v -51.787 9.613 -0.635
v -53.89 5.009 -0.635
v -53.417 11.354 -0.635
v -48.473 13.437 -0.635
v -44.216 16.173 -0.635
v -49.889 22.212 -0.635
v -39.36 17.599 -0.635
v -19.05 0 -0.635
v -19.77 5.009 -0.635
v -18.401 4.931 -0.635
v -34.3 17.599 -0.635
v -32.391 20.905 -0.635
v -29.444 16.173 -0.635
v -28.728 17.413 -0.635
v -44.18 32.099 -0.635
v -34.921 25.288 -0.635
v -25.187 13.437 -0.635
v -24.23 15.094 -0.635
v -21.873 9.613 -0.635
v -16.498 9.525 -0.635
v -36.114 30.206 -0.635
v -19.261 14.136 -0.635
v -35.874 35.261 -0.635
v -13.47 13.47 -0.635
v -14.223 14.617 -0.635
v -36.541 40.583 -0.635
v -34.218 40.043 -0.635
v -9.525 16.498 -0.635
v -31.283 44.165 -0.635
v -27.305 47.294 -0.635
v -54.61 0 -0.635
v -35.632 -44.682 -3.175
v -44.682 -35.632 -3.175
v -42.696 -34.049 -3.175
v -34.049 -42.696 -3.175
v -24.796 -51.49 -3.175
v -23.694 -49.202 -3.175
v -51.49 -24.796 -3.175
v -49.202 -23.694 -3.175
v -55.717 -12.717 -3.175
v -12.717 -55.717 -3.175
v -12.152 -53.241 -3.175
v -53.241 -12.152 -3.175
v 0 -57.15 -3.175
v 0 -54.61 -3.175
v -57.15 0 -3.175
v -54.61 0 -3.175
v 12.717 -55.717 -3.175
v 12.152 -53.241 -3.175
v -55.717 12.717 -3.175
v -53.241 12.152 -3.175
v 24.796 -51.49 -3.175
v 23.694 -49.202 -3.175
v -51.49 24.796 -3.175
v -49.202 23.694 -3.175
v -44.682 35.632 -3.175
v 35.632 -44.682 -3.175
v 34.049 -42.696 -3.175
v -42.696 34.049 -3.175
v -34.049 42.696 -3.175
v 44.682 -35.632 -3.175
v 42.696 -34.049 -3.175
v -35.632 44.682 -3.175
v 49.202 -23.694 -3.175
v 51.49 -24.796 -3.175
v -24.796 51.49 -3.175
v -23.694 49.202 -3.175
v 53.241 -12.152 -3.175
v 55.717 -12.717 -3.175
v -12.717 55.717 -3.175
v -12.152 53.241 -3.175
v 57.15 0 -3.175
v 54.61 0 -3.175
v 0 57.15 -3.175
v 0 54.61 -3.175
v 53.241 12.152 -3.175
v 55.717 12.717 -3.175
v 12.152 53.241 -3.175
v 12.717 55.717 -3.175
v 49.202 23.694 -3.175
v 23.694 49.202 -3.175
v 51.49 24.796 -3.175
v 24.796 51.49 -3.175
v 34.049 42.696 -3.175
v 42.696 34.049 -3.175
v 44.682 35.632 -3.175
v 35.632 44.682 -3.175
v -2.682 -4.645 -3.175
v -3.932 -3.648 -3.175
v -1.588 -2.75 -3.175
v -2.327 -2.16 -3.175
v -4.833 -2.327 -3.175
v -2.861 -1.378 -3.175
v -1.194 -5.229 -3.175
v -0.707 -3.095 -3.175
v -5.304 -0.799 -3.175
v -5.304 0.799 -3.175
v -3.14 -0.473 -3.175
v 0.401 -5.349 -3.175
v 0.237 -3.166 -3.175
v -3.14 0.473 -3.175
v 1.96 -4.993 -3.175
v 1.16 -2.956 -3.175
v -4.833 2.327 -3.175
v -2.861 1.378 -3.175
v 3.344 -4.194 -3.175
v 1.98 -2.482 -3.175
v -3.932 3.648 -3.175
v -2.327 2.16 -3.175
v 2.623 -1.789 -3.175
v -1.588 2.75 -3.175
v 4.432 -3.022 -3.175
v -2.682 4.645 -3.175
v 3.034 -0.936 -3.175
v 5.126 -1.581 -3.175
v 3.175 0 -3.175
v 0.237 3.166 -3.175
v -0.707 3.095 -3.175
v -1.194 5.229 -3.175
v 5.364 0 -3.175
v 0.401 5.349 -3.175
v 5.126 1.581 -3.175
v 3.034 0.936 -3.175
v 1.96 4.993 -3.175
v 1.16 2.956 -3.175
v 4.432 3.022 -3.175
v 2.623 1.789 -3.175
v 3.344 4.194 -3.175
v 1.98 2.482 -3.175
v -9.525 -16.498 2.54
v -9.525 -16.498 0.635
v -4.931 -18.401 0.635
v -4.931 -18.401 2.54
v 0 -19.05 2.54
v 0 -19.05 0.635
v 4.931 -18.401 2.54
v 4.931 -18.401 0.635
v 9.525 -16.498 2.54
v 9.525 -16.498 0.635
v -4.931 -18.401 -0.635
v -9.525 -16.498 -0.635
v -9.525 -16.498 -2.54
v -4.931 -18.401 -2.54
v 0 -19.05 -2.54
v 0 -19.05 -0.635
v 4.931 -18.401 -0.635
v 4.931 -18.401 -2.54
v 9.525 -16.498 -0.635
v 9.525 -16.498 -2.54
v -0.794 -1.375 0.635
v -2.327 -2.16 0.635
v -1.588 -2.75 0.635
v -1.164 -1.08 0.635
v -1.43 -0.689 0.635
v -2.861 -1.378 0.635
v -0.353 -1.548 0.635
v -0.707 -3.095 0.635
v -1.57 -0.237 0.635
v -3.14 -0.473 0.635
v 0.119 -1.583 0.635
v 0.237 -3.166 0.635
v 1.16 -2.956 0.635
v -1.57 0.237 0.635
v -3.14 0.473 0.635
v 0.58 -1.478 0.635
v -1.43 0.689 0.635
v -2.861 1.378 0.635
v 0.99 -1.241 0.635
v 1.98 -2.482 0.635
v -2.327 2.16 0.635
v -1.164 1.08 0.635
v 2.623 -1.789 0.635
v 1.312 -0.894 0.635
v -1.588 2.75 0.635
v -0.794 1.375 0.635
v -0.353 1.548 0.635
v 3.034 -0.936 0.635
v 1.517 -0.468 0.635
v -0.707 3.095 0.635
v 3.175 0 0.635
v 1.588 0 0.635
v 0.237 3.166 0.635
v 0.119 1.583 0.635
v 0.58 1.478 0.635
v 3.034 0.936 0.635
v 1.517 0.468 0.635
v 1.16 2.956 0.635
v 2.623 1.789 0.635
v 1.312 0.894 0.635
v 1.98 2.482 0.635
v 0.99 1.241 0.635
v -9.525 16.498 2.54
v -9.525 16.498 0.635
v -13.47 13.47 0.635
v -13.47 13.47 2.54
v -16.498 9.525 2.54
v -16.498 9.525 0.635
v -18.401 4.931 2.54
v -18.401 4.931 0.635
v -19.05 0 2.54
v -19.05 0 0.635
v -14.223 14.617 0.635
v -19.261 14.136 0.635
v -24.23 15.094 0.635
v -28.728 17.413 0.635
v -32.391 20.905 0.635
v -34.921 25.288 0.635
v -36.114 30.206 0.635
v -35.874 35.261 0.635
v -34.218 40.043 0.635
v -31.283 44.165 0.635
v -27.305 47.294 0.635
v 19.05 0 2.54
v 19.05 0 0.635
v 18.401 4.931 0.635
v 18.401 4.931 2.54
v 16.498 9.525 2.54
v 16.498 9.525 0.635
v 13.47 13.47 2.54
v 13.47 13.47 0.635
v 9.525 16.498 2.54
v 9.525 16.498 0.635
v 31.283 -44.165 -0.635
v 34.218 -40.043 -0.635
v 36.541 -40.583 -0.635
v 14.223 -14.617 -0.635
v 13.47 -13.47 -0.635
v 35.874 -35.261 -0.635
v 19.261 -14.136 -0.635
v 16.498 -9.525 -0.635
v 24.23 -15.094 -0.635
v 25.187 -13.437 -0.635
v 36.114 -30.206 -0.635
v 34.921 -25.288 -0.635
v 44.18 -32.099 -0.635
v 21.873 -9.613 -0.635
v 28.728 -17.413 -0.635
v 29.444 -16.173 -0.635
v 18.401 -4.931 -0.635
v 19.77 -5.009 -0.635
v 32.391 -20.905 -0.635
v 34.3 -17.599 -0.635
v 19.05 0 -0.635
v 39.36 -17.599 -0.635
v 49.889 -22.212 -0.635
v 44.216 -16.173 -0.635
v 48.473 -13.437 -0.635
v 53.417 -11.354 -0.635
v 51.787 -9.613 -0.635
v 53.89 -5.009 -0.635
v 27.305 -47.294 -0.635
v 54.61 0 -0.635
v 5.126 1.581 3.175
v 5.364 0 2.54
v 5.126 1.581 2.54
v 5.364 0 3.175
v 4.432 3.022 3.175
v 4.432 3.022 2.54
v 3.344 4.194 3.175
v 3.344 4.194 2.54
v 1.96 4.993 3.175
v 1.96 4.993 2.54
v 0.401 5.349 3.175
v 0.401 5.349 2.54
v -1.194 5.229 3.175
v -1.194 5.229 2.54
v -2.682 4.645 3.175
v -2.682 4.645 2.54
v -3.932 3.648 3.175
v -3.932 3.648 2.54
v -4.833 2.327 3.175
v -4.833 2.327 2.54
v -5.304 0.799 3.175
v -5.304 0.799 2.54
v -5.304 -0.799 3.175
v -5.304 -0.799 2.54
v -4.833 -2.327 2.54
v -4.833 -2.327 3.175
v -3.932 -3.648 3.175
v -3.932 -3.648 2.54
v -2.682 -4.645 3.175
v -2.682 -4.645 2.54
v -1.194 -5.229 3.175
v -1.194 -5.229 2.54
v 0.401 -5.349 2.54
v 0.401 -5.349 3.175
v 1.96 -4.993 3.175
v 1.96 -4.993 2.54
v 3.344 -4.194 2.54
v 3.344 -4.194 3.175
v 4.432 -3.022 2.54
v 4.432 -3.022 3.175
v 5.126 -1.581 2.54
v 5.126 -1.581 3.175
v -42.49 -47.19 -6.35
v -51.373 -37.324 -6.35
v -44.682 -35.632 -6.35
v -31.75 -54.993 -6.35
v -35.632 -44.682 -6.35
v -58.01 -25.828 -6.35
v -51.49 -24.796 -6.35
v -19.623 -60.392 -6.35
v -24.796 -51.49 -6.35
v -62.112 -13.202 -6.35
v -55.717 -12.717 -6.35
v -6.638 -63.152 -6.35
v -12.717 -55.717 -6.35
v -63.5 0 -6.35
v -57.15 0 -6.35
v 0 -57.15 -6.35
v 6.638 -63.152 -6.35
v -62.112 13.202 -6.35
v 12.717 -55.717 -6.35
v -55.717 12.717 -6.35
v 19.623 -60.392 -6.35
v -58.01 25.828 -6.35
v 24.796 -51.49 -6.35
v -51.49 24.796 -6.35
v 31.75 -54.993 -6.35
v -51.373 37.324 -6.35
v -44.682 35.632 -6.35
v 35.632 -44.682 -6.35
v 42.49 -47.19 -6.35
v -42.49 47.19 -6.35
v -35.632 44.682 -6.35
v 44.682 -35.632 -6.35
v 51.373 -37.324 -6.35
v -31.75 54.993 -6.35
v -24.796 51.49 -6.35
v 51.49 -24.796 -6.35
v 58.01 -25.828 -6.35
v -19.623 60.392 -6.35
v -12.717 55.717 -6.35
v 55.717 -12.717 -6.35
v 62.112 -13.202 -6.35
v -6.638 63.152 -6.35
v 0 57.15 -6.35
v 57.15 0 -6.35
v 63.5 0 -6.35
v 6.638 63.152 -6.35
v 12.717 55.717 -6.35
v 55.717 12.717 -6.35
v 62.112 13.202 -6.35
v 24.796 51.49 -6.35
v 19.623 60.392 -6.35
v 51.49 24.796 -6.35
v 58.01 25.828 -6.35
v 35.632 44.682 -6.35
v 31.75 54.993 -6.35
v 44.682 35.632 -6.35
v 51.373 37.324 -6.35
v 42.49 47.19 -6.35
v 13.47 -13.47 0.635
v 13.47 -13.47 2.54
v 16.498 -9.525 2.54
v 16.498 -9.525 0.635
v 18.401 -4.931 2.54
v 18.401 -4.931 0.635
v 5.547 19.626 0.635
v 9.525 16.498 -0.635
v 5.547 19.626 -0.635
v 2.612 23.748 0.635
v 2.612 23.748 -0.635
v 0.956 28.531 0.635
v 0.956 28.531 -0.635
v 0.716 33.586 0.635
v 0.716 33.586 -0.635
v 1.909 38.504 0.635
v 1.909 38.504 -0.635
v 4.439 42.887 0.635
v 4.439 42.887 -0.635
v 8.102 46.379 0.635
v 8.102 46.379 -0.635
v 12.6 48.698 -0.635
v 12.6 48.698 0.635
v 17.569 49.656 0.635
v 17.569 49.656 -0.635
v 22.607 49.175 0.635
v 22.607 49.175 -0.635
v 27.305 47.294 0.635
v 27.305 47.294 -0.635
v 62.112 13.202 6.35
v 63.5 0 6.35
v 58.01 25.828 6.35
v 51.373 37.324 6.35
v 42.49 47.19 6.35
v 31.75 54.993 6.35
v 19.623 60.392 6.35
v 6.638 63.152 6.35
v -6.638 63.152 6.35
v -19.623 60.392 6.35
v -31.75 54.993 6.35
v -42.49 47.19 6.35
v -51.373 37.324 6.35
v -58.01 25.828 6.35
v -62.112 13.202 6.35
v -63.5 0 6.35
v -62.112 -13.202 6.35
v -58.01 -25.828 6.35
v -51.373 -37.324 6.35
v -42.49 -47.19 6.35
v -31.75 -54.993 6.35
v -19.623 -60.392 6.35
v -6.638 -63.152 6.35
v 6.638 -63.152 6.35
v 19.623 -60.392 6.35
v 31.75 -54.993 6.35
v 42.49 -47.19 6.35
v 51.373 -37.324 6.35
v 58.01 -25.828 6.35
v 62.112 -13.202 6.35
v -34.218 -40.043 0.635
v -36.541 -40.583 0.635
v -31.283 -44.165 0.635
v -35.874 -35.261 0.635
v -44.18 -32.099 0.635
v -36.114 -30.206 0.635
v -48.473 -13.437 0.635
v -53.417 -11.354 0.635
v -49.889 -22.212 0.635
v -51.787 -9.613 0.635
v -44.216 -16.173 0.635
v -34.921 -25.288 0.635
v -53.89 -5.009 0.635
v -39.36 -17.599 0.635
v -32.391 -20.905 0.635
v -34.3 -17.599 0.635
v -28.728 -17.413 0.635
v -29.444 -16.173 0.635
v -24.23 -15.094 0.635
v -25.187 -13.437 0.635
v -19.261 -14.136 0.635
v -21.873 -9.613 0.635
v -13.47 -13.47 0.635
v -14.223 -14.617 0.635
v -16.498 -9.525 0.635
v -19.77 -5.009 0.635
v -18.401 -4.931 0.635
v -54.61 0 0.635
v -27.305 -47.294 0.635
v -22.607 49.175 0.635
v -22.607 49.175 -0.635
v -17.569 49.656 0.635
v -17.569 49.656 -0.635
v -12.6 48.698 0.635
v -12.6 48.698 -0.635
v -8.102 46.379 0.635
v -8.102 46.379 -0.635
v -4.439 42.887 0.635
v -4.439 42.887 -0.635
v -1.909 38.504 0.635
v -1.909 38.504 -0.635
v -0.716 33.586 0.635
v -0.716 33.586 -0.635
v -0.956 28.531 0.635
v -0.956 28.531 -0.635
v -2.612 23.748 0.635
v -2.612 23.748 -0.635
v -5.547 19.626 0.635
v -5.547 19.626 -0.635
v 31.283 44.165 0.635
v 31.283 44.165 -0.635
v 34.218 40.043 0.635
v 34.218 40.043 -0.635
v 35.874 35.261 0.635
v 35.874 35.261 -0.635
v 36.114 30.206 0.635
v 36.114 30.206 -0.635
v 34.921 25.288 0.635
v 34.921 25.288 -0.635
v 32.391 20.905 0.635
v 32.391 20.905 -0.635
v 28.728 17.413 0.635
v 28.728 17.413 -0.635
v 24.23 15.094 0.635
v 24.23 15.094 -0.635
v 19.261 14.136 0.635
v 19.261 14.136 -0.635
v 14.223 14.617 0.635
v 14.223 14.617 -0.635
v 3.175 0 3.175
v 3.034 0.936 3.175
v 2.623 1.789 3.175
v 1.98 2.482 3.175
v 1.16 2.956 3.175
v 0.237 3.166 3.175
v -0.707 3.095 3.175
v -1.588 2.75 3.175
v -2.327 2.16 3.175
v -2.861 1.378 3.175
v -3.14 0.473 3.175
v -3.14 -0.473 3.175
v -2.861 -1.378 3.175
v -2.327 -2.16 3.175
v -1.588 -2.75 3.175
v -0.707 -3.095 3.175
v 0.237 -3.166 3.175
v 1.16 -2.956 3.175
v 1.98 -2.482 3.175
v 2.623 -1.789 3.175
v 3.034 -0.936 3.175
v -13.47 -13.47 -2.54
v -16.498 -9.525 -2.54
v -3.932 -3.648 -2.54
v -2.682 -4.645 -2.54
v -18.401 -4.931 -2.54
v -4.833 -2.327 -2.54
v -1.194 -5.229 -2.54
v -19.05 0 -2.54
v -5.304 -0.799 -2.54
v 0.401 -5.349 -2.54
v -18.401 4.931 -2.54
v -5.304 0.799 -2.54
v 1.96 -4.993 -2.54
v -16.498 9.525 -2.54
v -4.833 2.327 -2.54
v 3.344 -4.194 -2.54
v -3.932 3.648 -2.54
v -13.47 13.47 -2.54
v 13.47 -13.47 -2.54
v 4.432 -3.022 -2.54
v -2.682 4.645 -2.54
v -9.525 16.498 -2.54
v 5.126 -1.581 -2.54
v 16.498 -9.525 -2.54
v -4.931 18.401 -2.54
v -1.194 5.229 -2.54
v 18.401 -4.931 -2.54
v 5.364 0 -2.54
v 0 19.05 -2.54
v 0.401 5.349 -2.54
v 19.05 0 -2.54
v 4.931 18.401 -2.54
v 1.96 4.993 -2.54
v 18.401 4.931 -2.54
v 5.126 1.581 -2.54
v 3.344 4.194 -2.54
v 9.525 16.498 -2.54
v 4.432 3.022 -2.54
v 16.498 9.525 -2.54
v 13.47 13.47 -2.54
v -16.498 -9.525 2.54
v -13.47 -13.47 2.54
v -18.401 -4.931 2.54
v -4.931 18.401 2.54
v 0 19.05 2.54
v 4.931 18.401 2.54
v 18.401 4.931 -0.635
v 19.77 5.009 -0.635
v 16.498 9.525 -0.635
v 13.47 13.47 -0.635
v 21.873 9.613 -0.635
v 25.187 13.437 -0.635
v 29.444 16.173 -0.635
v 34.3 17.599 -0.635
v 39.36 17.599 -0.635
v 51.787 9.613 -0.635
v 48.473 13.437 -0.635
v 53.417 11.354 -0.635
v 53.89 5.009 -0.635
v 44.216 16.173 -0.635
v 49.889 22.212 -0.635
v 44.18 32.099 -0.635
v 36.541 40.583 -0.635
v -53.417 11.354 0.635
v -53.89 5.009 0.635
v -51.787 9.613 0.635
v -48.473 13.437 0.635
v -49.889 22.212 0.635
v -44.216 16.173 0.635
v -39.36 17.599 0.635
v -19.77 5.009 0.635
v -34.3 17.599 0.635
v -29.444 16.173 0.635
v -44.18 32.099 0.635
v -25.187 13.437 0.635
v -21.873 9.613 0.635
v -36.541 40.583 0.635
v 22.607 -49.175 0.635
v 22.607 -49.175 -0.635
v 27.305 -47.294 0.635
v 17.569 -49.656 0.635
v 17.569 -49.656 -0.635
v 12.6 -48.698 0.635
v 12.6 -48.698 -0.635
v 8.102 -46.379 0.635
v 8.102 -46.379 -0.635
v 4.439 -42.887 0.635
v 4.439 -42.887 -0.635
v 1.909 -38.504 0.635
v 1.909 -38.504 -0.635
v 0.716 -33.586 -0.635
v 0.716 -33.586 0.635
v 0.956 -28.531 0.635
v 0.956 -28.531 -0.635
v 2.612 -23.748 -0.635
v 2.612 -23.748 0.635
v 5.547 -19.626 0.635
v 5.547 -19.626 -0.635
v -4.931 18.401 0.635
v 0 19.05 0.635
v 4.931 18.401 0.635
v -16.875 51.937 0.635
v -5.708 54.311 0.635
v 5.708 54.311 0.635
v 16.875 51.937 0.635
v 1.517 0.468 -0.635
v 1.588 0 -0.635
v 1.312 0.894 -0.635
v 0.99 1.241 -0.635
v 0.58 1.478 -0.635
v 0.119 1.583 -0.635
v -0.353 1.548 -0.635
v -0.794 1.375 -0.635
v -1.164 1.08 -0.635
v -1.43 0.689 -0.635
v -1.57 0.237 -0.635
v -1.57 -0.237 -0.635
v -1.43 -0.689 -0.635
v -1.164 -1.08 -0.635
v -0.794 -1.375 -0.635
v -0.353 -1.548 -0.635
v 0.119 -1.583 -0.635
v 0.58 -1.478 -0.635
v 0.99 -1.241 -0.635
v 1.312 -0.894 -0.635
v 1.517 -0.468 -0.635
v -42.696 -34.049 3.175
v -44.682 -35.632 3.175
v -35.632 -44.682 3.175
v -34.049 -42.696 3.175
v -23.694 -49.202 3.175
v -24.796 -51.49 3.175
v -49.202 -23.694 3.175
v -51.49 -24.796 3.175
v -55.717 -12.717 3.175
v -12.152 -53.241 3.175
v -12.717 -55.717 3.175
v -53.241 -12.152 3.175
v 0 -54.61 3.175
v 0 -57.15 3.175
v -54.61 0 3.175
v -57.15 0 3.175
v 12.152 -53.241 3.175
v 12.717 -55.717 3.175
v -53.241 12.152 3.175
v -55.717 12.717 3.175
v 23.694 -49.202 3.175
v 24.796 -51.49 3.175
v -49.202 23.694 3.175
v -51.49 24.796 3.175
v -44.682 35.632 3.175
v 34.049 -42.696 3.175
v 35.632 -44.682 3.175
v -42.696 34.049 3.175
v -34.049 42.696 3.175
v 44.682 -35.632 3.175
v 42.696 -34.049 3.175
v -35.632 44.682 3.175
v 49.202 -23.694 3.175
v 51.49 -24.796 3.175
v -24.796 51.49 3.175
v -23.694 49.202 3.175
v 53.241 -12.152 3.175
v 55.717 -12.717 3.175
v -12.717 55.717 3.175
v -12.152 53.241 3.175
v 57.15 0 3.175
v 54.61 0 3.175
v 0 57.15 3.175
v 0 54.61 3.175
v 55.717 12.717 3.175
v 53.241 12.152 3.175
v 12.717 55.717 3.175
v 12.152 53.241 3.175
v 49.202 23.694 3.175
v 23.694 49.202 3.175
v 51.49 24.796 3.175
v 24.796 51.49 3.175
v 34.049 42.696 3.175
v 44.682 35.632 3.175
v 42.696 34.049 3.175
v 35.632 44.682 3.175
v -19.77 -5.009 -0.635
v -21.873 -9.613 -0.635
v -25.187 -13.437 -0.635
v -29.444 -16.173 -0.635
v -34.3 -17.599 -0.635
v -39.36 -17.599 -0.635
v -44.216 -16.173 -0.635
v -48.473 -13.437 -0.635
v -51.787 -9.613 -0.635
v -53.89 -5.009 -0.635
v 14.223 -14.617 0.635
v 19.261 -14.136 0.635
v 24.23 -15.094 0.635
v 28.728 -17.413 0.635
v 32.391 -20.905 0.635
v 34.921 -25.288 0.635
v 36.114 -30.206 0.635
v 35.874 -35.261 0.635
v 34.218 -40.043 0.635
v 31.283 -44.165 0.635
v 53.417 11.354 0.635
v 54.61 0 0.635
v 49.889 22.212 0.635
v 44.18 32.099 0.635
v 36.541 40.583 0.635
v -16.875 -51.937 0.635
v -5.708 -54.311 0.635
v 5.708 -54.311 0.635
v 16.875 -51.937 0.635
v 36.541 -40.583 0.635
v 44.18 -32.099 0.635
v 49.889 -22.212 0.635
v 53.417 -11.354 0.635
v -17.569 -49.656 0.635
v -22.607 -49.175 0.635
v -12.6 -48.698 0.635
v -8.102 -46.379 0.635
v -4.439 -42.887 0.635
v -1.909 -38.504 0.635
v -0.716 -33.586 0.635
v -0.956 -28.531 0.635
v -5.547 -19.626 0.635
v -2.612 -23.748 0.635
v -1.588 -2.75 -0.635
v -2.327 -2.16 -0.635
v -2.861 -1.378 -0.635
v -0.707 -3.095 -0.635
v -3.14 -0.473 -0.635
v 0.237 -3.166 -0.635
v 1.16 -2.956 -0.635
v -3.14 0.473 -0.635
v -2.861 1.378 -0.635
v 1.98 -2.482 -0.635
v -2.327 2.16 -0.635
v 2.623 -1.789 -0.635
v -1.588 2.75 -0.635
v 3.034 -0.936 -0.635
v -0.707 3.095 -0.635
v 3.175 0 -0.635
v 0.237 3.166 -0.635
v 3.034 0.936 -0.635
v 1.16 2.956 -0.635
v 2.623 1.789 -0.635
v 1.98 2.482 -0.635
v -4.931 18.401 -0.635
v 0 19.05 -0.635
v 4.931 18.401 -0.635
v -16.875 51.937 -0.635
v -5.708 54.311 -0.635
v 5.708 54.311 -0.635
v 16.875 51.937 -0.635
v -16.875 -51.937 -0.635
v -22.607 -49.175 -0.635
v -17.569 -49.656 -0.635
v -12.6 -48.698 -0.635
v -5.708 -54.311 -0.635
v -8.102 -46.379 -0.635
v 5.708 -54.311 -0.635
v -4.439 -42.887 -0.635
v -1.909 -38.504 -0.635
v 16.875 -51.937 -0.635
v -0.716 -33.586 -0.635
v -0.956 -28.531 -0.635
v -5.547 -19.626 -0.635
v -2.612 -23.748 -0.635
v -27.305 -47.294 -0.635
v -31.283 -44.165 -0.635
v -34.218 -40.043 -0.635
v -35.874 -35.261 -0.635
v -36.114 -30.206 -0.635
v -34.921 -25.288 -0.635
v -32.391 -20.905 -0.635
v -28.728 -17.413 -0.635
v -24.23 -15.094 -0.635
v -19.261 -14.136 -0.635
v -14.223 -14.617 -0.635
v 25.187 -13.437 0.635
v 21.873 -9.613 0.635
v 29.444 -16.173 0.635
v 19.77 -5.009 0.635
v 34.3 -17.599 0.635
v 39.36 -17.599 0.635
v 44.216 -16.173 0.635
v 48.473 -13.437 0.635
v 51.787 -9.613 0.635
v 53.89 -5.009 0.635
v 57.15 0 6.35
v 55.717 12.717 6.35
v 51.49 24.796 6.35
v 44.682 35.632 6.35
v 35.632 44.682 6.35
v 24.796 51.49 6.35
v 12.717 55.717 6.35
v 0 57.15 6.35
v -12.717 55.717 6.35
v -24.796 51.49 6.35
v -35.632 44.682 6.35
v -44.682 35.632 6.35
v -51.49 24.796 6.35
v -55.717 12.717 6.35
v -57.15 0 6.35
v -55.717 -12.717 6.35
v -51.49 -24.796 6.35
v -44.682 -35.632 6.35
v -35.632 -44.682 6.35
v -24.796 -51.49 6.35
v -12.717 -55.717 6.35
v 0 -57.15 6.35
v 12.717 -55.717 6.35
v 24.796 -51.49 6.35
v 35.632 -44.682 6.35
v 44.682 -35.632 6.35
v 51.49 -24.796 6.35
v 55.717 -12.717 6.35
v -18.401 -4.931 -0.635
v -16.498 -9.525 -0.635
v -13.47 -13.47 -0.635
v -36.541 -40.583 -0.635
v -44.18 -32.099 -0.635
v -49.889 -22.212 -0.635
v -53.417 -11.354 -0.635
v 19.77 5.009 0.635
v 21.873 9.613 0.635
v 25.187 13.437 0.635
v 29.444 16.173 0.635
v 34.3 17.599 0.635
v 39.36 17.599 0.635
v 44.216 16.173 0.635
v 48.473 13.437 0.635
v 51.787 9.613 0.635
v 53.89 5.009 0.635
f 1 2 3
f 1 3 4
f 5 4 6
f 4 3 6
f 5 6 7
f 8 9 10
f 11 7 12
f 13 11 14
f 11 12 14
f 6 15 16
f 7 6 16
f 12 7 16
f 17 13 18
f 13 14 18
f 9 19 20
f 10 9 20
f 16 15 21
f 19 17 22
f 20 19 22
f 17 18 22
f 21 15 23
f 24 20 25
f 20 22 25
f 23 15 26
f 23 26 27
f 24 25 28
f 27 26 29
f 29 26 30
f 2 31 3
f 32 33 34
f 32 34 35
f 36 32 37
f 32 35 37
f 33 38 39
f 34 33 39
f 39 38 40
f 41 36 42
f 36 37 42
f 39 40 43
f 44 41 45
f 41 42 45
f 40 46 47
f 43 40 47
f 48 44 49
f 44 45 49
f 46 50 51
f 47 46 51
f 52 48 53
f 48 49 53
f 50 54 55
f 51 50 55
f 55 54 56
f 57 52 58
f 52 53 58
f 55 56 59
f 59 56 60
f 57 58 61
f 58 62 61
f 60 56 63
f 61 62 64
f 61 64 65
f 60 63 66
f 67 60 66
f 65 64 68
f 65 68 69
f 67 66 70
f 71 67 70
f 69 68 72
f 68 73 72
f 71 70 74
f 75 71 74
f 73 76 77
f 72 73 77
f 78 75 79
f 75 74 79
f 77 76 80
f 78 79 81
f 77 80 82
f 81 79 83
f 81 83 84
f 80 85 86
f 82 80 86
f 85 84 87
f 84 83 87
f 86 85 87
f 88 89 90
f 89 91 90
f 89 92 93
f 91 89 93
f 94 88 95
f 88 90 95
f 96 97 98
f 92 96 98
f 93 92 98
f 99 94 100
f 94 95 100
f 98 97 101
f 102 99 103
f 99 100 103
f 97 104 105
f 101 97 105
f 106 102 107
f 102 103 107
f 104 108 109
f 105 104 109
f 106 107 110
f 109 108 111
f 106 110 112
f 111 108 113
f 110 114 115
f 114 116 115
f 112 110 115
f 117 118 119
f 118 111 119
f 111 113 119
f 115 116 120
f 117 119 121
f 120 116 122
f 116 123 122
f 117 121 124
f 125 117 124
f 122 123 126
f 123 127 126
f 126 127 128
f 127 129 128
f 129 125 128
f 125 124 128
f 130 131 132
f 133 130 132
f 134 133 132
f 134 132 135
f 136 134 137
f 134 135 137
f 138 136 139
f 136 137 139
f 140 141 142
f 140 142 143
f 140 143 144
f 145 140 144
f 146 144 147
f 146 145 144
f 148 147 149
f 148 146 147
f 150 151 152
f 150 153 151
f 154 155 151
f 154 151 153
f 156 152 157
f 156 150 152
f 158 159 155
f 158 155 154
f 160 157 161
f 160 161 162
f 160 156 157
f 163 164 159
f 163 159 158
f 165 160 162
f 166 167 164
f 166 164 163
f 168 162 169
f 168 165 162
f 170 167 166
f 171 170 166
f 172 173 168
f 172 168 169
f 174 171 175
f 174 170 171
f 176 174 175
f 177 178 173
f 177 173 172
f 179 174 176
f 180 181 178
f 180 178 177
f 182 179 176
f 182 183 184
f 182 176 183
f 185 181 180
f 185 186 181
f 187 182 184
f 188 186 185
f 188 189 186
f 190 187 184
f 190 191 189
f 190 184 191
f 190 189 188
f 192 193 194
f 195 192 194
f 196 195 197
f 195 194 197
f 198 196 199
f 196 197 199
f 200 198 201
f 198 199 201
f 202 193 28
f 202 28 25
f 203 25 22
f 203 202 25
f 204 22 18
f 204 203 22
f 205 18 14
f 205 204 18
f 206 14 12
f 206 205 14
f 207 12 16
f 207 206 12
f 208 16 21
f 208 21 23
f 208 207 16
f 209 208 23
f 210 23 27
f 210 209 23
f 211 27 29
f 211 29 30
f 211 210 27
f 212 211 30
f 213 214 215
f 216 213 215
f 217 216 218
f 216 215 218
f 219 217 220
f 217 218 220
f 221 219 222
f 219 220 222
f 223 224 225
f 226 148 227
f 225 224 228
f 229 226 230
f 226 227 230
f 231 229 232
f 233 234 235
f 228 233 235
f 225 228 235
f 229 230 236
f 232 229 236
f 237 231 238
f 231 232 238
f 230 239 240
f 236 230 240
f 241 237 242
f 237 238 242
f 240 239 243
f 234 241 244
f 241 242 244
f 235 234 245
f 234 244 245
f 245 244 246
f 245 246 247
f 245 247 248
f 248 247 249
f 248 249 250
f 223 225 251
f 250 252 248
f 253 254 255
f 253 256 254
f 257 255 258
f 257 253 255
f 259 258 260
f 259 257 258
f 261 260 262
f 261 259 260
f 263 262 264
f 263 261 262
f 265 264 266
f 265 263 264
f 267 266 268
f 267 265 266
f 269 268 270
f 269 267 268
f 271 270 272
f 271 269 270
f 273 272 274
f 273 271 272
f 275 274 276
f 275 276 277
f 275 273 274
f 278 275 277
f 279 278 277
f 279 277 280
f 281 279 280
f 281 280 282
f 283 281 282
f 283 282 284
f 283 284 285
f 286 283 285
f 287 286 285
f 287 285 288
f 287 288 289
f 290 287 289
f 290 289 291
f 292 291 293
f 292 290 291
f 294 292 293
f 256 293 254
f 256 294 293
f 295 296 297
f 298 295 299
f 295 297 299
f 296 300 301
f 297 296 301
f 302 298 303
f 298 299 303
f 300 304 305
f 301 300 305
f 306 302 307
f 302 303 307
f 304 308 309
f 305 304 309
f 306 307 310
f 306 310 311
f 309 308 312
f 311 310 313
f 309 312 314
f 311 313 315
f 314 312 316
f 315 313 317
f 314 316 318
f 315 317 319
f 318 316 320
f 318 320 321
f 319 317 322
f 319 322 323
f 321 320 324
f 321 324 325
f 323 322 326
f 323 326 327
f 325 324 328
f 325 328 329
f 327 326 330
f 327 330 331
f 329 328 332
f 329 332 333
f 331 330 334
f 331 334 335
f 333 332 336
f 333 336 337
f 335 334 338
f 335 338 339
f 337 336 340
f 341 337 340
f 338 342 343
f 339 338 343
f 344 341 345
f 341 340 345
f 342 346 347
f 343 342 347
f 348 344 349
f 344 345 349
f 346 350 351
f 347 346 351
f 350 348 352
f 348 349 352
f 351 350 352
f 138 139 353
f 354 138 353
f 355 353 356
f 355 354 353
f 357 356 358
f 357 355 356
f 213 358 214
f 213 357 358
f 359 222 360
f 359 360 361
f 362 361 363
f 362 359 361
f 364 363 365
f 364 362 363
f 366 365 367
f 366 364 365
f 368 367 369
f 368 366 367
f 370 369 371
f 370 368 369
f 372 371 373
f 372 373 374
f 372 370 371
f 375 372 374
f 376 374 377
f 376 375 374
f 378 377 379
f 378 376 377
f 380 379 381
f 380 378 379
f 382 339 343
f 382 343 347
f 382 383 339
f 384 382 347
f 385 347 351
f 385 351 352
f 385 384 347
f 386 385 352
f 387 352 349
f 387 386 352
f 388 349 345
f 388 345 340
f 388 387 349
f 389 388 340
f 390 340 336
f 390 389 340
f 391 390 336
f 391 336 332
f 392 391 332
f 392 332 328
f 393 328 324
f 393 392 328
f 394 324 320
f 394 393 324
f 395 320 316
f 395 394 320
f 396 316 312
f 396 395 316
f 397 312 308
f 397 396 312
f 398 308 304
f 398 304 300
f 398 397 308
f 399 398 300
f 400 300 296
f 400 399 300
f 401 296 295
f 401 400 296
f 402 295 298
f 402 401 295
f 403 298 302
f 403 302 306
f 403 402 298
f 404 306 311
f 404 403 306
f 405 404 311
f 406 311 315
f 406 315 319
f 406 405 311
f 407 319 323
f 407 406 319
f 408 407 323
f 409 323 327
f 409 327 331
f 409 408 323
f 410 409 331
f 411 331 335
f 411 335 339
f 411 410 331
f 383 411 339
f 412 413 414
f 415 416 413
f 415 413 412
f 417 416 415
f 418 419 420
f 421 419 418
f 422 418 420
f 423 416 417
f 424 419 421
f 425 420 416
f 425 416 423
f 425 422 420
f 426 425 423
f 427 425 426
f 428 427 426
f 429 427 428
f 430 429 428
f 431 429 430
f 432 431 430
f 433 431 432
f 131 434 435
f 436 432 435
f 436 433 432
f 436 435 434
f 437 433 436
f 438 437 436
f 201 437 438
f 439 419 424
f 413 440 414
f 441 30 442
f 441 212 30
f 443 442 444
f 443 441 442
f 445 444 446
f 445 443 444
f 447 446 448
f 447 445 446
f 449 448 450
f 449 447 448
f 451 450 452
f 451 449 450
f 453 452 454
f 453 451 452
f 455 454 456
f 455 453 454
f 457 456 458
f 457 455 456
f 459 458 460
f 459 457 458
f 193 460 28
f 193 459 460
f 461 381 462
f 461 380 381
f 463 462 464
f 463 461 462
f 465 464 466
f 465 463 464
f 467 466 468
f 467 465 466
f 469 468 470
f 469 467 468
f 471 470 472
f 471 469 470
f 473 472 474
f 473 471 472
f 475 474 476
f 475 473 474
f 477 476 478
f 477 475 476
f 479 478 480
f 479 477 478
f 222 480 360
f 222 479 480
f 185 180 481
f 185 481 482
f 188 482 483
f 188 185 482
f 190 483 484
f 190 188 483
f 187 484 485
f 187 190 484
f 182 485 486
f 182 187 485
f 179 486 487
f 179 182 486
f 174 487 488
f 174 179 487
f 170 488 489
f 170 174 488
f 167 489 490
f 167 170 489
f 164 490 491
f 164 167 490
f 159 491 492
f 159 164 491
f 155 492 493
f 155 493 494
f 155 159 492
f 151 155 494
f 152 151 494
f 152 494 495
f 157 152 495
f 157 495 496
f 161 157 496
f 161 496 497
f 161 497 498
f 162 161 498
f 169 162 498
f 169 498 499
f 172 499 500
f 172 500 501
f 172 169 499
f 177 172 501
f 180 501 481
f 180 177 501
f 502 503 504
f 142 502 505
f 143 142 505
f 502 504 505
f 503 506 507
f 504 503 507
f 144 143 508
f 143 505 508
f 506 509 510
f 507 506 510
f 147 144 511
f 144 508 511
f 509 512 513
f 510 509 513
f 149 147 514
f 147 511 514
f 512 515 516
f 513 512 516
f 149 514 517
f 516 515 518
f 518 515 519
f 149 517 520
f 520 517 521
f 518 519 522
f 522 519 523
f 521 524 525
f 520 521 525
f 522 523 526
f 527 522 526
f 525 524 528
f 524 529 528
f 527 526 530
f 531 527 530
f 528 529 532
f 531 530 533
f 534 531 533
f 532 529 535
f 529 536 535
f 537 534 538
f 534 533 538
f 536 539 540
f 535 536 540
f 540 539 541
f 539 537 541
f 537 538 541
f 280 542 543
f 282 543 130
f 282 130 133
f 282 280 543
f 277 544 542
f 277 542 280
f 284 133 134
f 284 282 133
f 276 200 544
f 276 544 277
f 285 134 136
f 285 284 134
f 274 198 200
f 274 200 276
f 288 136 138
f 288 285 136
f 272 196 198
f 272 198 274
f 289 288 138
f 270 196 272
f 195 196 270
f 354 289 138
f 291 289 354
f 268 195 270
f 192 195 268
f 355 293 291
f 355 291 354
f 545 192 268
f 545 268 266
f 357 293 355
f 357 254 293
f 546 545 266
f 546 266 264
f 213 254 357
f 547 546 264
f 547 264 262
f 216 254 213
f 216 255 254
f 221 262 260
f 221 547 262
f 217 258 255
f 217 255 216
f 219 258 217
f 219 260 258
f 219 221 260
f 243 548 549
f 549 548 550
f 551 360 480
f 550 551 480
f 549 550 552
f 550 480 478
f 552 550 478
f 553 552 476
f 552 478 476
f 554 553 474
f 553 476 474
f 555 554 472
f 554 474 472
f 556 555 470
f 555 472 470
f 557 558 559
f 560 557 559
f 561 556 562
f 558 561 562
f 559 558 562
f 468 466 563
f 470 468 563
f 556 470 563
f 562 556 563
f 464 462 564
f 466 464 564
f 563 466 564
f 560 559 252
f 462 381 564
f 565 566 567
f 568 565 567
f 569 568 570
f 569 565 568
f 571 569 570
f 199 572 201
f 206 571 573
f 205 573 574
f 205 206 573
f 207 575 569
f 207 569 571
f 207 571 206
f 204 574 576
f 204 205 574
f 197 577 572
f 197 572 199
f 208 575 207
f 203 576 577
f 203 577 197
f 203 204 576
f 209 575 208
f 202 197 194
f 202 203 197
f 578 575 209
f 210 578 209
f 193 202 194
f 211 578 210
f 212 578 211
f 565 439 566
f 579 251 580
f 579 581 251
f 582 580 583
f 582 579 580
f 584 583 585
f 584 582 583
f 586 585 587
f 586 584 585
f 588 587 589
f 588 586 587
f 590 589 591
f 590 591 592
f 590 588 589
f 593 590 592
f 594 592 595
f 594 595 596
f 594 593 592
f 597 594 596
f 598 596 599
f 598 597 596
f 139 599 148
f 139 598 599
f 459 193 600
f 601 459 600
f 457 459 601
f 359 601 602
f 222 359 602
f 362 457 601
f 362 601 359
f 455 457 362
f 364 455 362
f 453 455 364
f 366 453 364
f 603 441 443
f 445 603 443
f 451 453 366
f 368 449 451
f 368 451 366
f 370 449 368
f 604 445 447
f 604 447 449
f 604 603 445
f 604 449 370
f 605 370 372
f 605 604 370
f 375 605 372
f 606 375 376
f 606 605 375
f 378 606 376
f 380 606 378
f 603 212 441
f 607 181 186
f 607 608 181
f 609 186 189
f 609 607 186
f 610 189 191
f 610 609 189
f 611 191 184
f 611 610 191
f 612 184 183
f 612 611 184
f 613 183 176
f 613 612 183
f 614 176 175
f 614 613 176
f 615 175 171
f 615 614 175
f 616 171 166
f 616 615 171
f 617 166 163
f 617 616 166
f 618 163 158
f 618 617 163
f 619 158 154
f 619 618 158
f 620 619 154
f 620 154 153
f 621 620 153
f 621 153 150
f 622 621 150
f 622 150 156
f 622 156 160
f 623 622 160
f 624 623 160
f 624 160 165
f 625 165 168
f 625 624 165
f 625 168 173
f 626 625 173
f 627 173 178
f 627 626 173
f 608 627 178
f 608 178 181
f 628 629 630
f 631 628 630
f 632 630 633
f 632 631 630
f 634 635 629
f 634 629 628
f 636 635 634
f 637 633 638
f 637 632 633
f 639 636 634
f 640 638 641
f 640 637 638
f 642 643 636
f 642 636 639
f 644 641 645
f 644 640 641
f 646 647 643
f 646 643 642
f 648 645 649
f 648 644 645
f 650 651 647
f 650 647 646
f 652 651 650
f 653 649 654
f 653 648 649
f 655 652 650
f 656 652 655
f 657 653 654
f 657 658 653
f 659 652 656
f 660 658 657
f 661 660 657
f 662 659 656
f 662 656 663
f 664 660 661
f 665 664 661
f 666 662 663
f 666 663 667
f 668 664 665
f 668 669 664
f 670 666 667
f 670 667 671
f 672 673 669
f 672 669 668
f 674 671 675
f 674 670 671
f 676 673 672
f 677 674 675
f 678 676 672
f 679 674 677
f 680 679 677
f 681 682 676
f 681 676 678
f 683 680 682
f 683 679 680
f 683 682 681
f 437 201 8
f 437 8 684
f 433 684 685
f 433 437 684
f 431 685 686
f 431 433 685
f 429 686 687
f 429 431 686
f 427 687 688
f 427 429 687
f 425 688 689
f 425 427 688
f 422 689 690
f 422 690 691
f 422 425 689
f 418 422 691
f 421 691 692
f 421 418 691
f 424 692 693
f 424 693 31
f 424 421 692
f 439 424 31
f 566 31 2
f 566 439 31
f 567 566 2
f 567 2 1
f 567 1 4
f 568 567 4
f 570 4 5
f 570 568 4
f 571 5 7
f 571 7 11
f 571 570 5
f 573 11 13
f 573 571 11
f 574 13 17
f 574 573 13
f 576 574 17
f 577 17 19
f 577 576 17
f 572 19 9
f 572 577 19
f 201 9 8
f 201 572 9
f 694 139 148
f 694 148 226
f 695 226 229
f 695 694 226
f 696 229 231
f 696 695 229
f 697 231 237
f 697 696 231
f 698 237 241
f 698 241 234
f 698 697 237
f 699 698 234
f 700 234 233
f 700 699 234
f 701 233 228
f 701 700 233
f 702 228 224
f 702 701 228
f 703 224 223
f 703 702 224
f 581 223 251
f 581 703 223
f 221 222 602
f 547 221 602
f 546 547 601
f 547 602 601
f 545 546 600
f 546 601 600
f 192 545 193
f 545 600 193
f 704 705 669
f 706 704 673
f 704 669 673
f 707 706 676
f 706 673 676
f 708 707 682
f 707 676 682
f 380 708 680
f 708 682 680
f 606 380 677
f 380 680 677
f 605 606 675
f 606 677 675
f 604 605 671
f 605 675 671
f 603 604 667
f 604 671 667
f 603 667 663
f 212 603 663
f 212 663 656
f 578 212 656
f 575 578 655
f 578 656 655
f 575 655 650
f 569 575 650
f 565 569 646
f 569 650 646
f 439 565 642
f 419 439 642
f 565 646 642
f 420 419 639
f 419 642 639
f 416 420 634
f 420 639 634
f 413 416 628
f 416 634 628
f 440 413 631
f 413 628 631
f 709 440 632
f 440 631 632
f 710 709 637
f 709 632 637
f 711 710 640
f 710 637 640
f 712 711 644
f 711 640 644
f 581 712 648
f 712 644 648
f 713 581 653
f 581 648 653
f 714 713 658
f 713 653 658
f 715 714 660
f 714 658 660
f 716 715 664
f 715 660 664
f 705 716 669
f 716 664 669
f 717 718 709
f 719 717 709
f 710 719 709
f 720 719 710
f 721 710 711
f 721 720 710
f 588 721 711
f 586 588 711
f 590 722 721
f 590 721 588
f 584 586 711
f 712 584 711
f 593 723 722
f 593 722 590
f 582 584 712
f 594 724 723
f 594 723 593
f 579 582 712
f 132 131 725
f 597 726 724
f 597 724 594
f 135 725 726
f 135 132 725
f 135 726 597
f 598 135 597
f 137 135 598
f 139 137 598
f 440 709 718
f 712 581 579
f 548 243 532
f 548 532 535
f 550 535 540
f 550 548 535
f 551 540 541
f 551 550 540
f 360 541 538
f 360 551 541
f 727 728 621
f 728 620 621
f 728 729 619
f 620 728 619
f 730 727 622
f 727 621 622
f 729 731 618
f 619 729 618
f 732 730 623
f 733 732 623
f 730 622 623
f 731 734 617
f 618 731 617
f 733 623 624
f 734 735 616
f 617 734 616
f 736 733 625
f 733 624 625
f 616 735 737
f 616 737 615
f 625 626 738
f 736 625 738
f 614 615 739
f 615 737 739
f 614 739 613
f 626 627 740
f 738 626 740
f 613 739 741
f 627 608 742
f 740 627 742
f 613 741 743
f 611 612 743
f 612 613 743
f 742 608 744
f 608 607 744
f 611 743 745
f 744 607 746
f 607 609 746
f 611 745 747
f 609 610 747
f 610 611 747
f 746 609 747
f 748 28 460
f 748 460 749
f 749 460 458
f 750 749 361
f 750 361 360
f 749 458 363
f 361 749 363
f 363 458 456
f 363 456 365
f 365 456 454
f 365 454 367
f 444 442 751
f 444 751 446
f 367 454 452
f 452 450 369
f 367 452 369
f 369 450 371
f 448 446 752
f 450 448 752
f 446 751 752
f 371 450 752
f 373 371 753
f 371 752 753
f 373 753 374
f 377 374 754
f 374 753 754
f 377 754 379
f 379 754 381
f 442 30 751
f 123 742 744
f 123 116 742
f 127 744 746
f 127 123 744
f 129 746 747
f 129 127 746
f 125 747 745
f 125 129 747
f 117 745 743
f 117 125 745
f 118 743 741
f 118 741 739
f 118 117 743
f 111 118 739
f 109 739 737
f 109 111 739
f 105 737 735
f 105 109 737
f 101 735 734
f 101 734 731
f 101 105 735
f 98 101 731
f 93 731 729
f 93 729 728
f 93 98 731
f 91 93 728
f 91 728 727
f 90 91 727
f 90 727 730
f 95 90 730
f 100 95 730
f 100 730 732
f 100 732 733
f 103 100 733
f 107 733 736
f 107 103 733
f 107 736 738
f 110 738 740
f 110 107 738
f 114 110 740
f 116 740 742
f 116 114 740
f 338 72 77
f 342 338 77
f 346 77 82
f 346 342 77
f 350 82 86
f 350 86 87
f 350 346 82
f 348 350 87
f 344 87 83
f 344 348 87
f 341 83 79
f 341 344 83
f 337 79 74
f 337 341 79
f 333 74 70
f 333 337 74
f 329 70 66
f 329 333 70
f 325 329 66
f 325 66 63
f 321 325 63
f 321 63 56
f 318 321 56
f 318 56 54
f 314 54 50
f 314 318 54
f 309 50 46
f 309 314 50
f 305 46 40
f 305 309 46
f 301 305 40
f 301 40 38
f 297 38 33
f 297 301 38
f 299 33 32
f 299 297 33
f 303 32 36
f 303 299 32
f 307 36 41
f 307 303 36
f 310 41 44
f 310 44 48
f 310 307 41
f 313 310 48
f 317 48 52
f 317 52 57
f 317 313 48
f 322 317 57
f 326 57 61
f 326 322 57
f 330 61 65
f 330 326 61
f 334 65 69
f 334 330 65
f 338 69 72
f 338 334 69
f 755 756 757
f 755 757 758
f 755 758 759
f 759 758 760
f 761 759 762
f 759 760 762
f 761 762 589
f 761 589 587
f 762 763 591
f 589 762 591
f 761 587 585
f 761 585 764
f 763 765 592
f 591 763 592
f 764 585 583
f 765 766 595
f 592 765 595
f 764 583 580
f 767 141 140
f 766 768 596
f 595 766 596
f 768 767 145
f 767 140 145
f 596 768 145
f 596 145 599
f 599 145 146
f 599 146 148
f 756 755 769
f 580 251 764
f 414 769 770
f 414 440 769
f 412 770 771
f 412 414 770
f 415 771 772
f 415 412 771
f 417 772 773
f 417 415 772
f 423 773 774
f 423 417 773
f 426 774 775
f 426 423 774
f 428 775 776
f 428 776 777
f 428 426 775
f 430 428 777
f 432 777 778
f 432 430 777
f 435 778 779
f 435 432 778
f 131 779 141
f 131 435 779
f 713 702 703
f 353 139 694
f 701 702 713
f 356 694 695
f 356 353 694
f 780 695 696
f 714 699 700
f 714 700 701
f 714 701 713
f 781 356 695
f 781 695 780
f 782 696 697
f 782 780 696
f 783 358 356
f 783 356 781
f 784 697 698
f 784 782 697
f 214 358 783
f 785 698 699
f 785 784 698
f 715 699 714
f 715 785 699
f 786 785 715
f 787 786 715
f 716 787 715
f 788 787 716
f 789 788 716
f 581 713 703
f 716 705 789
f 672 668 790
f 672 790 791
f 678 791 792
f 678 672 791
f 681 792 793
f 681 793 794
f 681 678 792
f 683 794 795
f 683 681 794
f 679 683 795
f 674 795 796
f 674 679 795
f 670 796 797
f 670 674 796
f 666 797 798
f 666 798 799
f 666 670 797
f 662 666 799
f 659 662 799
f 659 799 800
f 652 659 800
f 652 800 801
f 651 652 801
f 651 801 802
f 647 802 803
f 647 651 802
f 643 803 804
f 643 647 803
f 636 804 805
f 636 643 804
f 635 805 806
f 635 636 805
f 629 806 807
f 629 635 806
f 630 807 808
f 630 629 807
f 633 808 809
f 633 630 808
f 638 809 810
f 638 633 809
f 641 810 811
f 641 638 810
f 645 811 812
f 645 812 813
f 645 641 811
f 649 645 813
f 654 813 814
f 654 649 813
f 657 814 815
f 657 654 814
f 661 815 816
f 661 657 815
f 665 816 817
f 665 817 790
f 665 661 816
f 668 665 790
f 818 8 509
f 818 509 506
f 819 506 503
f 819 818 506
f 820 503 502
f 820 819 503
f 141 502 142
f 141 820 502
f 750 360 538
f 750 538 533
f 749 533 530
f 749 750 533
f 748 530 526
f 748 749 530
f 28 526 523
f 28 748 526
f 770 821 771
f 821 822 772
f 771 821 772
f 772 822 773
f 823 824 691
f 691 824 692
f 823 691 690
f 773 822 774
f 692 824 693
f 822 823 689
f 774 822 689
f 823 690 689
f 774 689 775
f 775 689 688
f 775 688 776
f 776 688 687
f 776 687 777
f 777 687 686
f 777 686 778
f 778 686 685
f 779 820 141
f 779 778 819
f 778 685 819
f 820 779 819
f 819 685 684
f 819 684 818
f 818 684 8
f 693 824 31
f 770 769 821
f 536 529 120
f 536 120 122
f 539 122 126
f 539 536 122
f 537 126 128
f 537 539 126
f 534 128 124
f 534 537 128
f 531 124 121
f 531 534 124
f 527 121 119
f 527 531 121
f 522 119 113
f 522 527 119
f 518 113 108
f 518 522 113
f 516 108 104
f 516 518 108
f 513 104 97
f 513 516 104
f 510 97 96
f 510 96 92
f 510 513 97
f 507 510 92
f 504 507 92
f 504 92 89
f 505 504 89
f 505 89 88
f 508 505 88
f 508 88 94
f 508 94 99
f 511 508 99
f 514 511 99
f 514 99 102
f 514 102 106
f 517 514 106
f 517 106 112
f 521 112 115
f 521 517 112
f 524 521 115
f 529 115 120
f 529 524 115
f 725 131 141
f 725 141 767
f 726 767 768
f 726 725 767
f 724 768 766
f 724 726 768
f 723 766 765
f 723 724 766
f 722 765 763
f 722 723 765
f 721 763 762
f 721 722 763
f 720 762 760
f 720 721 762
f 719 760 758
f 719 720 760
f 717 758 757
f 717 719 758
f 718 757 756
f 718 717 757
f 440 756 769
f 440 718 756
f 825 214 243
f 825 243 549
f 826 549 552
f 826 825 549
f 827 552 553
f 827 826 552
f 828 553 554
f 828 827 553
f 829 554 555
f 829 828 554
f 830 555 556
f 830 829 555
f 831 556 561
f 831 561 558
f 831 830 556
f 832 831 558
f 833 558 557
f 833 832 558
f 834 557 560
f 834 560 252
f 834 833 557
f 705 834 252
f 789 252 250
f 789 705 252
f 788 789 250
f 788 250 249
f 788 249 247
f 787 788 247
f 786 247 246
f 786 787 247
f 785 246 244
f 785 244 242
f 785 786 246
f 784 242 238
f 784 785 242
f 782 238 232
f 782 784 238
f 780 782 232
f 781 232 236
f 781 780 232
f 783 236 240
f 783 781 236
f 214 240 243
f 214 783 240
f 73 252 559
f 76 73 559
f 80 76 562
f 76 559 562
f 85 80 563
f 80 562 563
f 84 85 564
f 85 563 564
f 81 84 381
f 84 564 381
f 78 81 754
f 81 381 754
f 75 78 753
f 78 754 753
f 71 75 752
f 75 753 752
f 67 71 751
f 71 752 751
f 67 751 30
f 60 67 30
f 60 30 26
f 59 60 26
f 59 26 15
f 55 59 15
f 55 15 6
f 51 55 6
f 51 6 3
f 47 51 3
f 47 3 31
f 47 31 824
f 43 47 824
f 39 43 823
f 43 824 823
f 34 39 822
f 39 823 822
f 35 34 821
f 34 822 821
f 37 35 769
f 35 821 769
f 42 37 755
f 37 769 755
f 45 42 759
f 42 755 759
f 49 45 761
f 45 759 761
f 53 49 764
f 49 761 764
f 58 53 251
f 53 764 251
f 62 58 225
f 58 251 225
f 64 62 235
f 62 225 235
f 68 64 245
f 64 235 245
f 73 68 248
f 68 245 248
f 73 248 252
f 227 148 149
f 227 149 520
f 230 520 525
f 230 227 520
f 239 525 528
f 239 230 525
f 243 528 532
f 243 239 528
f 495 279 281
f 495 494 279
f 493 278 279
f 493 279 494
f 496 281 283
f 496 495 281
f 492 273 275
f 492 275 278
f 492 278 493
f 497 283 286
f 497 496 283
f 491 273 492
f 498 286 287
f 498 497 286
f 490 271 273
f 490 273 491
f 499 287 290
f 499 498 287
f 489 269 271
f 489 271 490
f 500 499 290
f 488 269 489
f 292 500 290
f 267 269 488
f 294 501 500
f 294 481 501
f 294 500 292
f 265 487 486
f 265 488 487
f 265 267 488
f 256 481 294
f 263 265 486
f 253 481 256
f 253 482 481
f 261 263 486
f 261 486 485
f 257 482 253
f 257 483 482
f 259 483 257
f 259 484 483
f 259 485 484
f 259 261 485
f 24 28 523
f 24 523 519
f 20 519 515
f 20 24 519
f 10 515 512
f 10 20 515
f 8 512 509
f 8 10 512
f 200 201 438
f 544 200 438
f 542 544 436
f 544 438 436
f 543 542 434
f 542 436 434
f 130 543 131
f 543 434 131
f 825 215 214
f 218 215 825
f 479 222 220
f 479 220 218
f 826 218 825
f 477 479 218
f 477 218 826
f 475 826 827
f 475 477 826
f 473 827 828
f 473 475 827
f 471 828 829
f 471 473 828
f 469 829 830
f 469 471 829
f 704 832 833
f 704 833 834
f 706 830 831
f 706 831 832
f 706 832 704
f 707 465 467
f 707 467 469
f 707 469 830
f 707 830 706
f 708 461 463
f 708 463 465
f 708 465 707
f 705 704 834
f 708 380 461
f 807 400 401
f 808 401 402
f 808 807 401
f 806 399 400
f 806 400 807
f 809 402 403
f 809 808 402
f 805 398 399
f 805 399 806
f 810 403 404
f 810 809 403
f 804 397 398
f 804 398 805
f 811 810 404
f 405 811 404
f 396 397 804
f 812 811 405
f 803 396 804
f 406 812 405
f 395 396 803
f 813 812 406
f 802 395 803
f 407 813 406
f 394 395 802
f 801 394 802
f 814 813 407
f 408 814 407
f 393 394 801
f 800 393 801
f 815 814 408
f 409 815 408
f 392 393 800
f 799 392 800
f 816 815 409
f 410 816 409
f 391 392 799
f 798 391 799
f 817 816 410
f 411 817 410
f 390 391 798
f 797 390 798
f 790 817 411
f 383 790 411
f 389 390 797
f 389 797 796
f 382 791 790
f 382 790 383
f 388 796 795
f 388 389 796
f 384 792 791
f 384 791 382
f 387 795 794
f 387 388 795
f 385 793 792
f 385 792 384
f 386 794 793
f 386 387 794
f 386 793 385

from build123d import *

# Parameters (mm, degrees)
SKETCH1_R             = 3.175
SKETCH1_R_2           = 1.5875
BOSS_EXTRUDE1_DEPTH   = 0.635
BOSS_EXTRUDE1_2_DEPTH = 0.635
BOSS_EXTRUDE1_3_DEPTH = 0.635
BOSS_EXTRUDE1_4_DEPTH = 0.635
BOSS_EXTRUDE1_5_DEPTH = 0.635
BOSS_EXTRUDE1_6_DEPTH = 0.635
BOSS_EXTRUDE1_7_DEPTH = 0.635
SKETCH1_3_R           = 57.15
SKETCH1_3_R_2         = 54.61
SKETCH1_3_R_3         = 5.363953164
SKETCH1_3_R_4         = 3.175
BOSS_EXTRUDE2_DEPTH   = 3.175
SKETCH1_4_R           = 5.363953164
BOSS_EXTRUDE4_DEPTH   = 2.54
SKETCH1_5_R           = 63.5
SKETCH1_5_R_2         = 57.15
BOSS_EXTRUDE5_DEPTH   = 6.35


with BuildPart() as part:
    # Sketch1 → Boss-Extrude1 (new, symmetric)
    with BuildSketch(Plane.XY):
        Circle(SKETCH1_R)
        Circle(SKETCH1_R_2, mode=Mode.SUBTRACT)
    extrude(amount=BOSS_EXTRUDE1_DEPTH, both=True)



with BuildPart() as body_2:
    # Sketch1 → Boss-Extrude1 2 (new, symmetric)
    with BuildSketch(Plane.XY):
        with BuildLine():
            ThreePointArc((54.61, 0), (36.83, -17.78), (19.05, 0))
            ThreePointArc((19.05, 0), (16.497783962, -9.524999965), (9.525000069, -16.497783902))
            ThreePointArc((9.525000069, -16.497783902), (33.812931696, -23.005715651), (27.30500001, -47.293647295))
            ThreePointArc((27.30500001, -47.293647295), (47.293647304, -27.304999995), (54.61, 0))
        make_face()
    extrude(amount=BOSS_EXTRUDE1_2_DEPTH, both=True)


with BuildPart() as body_3:
    # Sketch1 → Boss-Extrude1 3 (new, symmetric)
    with BuildSketch(Plane.XY):
        with BuildLine():
            ThreePointArc((9.524999881, 16.497784011), (16.497783908, 9.525000059), (19.05, 0))
            ThreePointArc((19.05, 0), (36.83, 17.78), (54.61, 0))
            ThreePointArc((54.61, 0), (47.293647334, 27.304999942), (27.305000115, 47.293647234))
            ThreePointArc((27.305000115, 47.293647234), (33.812931612, 23.005715504), (9.524999881, 16.497784011))
        make_face()
    extrude(amount=BOSS_EXTRUDE1_3_DEPTH, both=True)


with BuildPart() as body_4:
    # Sketch1 → Boss-Extrude1 4 (new, symmetric)
    with BuildSketch(Plane.XY):
        with BuildLine():
            ThreePointArc((-9.524999997, 16.497783944), (-6.7e-08, 19.05), (9.524999881, 16.497784011))
            ThreePointArc((9.524999881, 16.497784011), (3.017068388, 40.785715738), (27.305000115, 47.293647234))
            ThreePointArc((27.305000115, 47.293647234), (3.56e-07, 54.61), (-27.304999499, 47.29364759))
            ThreePointArc((-27.304999499, 47.29364759), (-3.017068177, 40.785715372), (-9.524999997, 16.497783944))
        make_face()
    extrude(amount=BOSS_EXTRUDE1_4_DEPTH, both=True)


with BuildPart() as body_5:
    # Sketch1 → Boss-Extrude1 5 (new, symmetric)
    with BuildSketch(Plane.XY):
        with BuildLine():
            ThreePointArc((27.30500001, -47.293647295), (3.017068304, -40.785715592), (9.525000069, -16.497783902))
            ThreePointArc((9.525000069, -16.497783902), (-3.12e-07, -19.05), (-9.525000609, -16.497783591))
            ThreePointArc((-9.525000609, -16.497783591), (-3.017068222, -40.785715451), (-27.305000268, -47.293647146))
            ThreePointArc((-27.305000268, -47.293647146), (-1.49e-07, -54.61), (27.30500001, -47.293647295))
        make_face()
    extrude(amount=BOSS_EXTRUDE1_5_DEPTH, both=True)


with BuildPart() as body_6:
    # Sketch1 → Boss-Extrude1 6 (new, symmetric)
    with BuildSketch(Plane.XY):
        with BuildLine():
            ThreePointArc((-19.05, 0), (-16.497783941, 9.525000001), (-9.524999997, 16.497783944))
            ThreePointArc((-9.524999997, 16.497783944), (-33.812931823, 23.005715871), (-27.304999499, 47.29364759))
            ThreePointArc((-27.304999499, 47.29364759), (-47.293647156, 27.305000251), (-54.61, 0))
            ThreePointArc((-54.61, 0), (-36.83, 17.78), (-19.05, 0))
        make_face()
    extrude(amount=BOSS_EXTRUDE1_6_DEPTH, both=True)


with BuildPart() as body_7:
    # Sketch1 → Boss-Extrude1 7 (new, symmetric)
    with BuildSketch(Plane.XY):
        with BuildLine():
            ThreePointArc((-27.305000268, -47.293647146), (-33.812931778, -23.005715792), (-9.525000609, -16.497783591))
            ThreePointArc((-9.525000609, -16.497783591), (-16.497784118, -9.524999696), (-19.05, 0))
            ThreePointArc((-19.05, 0), (-36.83, -17.78), (-54.61, 0))
            ThreePointArc((-54.61, 0), (-47.293647378, -27.304999866), (-27.305000268, -47.293647146))
        make_face()
    extrude(amount=BOSS_EXTRUDE1_7_DEPTH, both=True)


with BuildPart() as part_1:
    add(part.part)

    add(body_4.part)  # Boss-Extrude2 merges body 4

    add(body_7.part)  # Boss-Extrude2 merges body 7

    add(body_2.part)  # Boss-Extrude2 merges body 2
    # Sketch1<3> → Boss-Extrude2 (add, symmetric)
    # profile 1 of 2: a face of its own
    with BuildSketch(Plane.XY):
        Circle(SKETCH1_3_R)
        Circle(SKETCH1_3_R_2, mode=Mode.SUBTRACT)
    # profile 2 of 2: a face of its own
    with BuildSketch(Plane.XY):
        Circle(SKETCH1_3_R_3)
        Circle(SKETCH1_3_R_4, mode=Mode.SUBTRACT)
    extrude(amount=BOSS_EXTRUDE2_DEPTH, both=True)


    add(body_3.part)  # Boss-Extrude4 merges body 3

    add(body_5.part)  # Boss-Extrude4 merges body 5

    add(body_6.part)  # Boss-Extrude4 merges body 6
    # Sketch1<4> → Boss-Extrude4 (add, symmetric)
    with BuildSketch(Plane.XY):
        with BuildLine():
            ThreePointArc((9.525000069, -16.497783902), (16.497783962, -9.524999965), (19.05, 0))
            ThreePointArc((19.05, 0), (16.497783908, 9.525000059), (9.524999881, 16.497784011))
            ThreePointArc((9.524999881, 16.497784011), (-6.7e-08, 19.05), (-9.524999997, 16.497783944))
            ThreePointArc((-9.524999997, 16.497783944), (-16.497783941, 9.525000001), (-19.05, 0))
            ThreePointArc((-19.05, 0), (-16.497784118, -9.524999696), (-9.525000609, -16.497783591))
            ThreePointArc((-9.525000609, -16.497783591), (-3.12e-07, -19.05), (9.525000069, -16.497783902))
        make_face()
        Circle(SKETCH1_4_R, mode=Mode.SUBTRACT)
    extrude(amount=BOSS_EXTRUDE4_DEPTH, both=True)

    # Sketch1<5> → Boss-Extrude5 (add, symmetric)
    with BuildSketch(Plane.XY):
        Circle(SKETCH1_5_R)
        Circle(SKETCH1_5_R_2, mode=Mode.SUBTRACT)
    extrude(amount=BOSS_EXTRUDE5_DEPTH, both=True)


solid = part_1.part
